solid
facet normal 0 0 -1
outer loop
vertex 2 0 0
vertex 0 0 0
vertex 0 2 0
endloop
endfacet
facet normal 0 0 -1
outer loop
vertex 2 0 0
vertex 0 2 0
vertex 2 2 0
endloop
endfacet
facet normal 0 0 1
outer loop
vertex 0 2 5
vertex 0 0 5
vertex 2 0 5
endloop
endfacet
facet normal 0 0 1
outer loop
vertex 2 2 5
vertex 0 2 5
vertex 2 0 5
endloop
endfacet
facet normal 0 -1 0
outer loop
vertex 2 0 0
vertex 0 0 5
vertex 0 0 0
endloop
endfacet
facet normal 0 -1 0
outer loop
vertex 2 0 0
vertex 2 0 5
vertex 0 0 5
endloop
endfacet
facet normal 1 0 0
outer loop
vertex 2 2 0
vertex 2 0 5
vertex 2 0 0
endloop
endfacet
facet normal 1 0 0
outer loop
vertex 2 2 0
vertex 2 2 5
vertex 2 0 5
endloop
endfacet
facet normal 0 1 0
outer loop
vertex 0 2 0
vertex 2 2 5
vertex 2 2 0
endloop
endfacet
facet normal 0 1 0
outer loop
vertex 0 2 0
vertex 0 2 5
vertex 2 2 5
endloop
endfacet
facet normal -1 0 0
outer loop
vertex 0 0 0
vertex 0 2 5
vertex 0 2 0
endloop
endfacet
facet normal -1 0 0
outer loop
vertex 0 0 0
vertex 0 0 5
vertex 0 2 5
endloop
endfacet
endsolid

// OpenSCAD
// extrusion along a direction vector
linear_extrude(height = 5, v = [1, 0, 2]) square(2);
